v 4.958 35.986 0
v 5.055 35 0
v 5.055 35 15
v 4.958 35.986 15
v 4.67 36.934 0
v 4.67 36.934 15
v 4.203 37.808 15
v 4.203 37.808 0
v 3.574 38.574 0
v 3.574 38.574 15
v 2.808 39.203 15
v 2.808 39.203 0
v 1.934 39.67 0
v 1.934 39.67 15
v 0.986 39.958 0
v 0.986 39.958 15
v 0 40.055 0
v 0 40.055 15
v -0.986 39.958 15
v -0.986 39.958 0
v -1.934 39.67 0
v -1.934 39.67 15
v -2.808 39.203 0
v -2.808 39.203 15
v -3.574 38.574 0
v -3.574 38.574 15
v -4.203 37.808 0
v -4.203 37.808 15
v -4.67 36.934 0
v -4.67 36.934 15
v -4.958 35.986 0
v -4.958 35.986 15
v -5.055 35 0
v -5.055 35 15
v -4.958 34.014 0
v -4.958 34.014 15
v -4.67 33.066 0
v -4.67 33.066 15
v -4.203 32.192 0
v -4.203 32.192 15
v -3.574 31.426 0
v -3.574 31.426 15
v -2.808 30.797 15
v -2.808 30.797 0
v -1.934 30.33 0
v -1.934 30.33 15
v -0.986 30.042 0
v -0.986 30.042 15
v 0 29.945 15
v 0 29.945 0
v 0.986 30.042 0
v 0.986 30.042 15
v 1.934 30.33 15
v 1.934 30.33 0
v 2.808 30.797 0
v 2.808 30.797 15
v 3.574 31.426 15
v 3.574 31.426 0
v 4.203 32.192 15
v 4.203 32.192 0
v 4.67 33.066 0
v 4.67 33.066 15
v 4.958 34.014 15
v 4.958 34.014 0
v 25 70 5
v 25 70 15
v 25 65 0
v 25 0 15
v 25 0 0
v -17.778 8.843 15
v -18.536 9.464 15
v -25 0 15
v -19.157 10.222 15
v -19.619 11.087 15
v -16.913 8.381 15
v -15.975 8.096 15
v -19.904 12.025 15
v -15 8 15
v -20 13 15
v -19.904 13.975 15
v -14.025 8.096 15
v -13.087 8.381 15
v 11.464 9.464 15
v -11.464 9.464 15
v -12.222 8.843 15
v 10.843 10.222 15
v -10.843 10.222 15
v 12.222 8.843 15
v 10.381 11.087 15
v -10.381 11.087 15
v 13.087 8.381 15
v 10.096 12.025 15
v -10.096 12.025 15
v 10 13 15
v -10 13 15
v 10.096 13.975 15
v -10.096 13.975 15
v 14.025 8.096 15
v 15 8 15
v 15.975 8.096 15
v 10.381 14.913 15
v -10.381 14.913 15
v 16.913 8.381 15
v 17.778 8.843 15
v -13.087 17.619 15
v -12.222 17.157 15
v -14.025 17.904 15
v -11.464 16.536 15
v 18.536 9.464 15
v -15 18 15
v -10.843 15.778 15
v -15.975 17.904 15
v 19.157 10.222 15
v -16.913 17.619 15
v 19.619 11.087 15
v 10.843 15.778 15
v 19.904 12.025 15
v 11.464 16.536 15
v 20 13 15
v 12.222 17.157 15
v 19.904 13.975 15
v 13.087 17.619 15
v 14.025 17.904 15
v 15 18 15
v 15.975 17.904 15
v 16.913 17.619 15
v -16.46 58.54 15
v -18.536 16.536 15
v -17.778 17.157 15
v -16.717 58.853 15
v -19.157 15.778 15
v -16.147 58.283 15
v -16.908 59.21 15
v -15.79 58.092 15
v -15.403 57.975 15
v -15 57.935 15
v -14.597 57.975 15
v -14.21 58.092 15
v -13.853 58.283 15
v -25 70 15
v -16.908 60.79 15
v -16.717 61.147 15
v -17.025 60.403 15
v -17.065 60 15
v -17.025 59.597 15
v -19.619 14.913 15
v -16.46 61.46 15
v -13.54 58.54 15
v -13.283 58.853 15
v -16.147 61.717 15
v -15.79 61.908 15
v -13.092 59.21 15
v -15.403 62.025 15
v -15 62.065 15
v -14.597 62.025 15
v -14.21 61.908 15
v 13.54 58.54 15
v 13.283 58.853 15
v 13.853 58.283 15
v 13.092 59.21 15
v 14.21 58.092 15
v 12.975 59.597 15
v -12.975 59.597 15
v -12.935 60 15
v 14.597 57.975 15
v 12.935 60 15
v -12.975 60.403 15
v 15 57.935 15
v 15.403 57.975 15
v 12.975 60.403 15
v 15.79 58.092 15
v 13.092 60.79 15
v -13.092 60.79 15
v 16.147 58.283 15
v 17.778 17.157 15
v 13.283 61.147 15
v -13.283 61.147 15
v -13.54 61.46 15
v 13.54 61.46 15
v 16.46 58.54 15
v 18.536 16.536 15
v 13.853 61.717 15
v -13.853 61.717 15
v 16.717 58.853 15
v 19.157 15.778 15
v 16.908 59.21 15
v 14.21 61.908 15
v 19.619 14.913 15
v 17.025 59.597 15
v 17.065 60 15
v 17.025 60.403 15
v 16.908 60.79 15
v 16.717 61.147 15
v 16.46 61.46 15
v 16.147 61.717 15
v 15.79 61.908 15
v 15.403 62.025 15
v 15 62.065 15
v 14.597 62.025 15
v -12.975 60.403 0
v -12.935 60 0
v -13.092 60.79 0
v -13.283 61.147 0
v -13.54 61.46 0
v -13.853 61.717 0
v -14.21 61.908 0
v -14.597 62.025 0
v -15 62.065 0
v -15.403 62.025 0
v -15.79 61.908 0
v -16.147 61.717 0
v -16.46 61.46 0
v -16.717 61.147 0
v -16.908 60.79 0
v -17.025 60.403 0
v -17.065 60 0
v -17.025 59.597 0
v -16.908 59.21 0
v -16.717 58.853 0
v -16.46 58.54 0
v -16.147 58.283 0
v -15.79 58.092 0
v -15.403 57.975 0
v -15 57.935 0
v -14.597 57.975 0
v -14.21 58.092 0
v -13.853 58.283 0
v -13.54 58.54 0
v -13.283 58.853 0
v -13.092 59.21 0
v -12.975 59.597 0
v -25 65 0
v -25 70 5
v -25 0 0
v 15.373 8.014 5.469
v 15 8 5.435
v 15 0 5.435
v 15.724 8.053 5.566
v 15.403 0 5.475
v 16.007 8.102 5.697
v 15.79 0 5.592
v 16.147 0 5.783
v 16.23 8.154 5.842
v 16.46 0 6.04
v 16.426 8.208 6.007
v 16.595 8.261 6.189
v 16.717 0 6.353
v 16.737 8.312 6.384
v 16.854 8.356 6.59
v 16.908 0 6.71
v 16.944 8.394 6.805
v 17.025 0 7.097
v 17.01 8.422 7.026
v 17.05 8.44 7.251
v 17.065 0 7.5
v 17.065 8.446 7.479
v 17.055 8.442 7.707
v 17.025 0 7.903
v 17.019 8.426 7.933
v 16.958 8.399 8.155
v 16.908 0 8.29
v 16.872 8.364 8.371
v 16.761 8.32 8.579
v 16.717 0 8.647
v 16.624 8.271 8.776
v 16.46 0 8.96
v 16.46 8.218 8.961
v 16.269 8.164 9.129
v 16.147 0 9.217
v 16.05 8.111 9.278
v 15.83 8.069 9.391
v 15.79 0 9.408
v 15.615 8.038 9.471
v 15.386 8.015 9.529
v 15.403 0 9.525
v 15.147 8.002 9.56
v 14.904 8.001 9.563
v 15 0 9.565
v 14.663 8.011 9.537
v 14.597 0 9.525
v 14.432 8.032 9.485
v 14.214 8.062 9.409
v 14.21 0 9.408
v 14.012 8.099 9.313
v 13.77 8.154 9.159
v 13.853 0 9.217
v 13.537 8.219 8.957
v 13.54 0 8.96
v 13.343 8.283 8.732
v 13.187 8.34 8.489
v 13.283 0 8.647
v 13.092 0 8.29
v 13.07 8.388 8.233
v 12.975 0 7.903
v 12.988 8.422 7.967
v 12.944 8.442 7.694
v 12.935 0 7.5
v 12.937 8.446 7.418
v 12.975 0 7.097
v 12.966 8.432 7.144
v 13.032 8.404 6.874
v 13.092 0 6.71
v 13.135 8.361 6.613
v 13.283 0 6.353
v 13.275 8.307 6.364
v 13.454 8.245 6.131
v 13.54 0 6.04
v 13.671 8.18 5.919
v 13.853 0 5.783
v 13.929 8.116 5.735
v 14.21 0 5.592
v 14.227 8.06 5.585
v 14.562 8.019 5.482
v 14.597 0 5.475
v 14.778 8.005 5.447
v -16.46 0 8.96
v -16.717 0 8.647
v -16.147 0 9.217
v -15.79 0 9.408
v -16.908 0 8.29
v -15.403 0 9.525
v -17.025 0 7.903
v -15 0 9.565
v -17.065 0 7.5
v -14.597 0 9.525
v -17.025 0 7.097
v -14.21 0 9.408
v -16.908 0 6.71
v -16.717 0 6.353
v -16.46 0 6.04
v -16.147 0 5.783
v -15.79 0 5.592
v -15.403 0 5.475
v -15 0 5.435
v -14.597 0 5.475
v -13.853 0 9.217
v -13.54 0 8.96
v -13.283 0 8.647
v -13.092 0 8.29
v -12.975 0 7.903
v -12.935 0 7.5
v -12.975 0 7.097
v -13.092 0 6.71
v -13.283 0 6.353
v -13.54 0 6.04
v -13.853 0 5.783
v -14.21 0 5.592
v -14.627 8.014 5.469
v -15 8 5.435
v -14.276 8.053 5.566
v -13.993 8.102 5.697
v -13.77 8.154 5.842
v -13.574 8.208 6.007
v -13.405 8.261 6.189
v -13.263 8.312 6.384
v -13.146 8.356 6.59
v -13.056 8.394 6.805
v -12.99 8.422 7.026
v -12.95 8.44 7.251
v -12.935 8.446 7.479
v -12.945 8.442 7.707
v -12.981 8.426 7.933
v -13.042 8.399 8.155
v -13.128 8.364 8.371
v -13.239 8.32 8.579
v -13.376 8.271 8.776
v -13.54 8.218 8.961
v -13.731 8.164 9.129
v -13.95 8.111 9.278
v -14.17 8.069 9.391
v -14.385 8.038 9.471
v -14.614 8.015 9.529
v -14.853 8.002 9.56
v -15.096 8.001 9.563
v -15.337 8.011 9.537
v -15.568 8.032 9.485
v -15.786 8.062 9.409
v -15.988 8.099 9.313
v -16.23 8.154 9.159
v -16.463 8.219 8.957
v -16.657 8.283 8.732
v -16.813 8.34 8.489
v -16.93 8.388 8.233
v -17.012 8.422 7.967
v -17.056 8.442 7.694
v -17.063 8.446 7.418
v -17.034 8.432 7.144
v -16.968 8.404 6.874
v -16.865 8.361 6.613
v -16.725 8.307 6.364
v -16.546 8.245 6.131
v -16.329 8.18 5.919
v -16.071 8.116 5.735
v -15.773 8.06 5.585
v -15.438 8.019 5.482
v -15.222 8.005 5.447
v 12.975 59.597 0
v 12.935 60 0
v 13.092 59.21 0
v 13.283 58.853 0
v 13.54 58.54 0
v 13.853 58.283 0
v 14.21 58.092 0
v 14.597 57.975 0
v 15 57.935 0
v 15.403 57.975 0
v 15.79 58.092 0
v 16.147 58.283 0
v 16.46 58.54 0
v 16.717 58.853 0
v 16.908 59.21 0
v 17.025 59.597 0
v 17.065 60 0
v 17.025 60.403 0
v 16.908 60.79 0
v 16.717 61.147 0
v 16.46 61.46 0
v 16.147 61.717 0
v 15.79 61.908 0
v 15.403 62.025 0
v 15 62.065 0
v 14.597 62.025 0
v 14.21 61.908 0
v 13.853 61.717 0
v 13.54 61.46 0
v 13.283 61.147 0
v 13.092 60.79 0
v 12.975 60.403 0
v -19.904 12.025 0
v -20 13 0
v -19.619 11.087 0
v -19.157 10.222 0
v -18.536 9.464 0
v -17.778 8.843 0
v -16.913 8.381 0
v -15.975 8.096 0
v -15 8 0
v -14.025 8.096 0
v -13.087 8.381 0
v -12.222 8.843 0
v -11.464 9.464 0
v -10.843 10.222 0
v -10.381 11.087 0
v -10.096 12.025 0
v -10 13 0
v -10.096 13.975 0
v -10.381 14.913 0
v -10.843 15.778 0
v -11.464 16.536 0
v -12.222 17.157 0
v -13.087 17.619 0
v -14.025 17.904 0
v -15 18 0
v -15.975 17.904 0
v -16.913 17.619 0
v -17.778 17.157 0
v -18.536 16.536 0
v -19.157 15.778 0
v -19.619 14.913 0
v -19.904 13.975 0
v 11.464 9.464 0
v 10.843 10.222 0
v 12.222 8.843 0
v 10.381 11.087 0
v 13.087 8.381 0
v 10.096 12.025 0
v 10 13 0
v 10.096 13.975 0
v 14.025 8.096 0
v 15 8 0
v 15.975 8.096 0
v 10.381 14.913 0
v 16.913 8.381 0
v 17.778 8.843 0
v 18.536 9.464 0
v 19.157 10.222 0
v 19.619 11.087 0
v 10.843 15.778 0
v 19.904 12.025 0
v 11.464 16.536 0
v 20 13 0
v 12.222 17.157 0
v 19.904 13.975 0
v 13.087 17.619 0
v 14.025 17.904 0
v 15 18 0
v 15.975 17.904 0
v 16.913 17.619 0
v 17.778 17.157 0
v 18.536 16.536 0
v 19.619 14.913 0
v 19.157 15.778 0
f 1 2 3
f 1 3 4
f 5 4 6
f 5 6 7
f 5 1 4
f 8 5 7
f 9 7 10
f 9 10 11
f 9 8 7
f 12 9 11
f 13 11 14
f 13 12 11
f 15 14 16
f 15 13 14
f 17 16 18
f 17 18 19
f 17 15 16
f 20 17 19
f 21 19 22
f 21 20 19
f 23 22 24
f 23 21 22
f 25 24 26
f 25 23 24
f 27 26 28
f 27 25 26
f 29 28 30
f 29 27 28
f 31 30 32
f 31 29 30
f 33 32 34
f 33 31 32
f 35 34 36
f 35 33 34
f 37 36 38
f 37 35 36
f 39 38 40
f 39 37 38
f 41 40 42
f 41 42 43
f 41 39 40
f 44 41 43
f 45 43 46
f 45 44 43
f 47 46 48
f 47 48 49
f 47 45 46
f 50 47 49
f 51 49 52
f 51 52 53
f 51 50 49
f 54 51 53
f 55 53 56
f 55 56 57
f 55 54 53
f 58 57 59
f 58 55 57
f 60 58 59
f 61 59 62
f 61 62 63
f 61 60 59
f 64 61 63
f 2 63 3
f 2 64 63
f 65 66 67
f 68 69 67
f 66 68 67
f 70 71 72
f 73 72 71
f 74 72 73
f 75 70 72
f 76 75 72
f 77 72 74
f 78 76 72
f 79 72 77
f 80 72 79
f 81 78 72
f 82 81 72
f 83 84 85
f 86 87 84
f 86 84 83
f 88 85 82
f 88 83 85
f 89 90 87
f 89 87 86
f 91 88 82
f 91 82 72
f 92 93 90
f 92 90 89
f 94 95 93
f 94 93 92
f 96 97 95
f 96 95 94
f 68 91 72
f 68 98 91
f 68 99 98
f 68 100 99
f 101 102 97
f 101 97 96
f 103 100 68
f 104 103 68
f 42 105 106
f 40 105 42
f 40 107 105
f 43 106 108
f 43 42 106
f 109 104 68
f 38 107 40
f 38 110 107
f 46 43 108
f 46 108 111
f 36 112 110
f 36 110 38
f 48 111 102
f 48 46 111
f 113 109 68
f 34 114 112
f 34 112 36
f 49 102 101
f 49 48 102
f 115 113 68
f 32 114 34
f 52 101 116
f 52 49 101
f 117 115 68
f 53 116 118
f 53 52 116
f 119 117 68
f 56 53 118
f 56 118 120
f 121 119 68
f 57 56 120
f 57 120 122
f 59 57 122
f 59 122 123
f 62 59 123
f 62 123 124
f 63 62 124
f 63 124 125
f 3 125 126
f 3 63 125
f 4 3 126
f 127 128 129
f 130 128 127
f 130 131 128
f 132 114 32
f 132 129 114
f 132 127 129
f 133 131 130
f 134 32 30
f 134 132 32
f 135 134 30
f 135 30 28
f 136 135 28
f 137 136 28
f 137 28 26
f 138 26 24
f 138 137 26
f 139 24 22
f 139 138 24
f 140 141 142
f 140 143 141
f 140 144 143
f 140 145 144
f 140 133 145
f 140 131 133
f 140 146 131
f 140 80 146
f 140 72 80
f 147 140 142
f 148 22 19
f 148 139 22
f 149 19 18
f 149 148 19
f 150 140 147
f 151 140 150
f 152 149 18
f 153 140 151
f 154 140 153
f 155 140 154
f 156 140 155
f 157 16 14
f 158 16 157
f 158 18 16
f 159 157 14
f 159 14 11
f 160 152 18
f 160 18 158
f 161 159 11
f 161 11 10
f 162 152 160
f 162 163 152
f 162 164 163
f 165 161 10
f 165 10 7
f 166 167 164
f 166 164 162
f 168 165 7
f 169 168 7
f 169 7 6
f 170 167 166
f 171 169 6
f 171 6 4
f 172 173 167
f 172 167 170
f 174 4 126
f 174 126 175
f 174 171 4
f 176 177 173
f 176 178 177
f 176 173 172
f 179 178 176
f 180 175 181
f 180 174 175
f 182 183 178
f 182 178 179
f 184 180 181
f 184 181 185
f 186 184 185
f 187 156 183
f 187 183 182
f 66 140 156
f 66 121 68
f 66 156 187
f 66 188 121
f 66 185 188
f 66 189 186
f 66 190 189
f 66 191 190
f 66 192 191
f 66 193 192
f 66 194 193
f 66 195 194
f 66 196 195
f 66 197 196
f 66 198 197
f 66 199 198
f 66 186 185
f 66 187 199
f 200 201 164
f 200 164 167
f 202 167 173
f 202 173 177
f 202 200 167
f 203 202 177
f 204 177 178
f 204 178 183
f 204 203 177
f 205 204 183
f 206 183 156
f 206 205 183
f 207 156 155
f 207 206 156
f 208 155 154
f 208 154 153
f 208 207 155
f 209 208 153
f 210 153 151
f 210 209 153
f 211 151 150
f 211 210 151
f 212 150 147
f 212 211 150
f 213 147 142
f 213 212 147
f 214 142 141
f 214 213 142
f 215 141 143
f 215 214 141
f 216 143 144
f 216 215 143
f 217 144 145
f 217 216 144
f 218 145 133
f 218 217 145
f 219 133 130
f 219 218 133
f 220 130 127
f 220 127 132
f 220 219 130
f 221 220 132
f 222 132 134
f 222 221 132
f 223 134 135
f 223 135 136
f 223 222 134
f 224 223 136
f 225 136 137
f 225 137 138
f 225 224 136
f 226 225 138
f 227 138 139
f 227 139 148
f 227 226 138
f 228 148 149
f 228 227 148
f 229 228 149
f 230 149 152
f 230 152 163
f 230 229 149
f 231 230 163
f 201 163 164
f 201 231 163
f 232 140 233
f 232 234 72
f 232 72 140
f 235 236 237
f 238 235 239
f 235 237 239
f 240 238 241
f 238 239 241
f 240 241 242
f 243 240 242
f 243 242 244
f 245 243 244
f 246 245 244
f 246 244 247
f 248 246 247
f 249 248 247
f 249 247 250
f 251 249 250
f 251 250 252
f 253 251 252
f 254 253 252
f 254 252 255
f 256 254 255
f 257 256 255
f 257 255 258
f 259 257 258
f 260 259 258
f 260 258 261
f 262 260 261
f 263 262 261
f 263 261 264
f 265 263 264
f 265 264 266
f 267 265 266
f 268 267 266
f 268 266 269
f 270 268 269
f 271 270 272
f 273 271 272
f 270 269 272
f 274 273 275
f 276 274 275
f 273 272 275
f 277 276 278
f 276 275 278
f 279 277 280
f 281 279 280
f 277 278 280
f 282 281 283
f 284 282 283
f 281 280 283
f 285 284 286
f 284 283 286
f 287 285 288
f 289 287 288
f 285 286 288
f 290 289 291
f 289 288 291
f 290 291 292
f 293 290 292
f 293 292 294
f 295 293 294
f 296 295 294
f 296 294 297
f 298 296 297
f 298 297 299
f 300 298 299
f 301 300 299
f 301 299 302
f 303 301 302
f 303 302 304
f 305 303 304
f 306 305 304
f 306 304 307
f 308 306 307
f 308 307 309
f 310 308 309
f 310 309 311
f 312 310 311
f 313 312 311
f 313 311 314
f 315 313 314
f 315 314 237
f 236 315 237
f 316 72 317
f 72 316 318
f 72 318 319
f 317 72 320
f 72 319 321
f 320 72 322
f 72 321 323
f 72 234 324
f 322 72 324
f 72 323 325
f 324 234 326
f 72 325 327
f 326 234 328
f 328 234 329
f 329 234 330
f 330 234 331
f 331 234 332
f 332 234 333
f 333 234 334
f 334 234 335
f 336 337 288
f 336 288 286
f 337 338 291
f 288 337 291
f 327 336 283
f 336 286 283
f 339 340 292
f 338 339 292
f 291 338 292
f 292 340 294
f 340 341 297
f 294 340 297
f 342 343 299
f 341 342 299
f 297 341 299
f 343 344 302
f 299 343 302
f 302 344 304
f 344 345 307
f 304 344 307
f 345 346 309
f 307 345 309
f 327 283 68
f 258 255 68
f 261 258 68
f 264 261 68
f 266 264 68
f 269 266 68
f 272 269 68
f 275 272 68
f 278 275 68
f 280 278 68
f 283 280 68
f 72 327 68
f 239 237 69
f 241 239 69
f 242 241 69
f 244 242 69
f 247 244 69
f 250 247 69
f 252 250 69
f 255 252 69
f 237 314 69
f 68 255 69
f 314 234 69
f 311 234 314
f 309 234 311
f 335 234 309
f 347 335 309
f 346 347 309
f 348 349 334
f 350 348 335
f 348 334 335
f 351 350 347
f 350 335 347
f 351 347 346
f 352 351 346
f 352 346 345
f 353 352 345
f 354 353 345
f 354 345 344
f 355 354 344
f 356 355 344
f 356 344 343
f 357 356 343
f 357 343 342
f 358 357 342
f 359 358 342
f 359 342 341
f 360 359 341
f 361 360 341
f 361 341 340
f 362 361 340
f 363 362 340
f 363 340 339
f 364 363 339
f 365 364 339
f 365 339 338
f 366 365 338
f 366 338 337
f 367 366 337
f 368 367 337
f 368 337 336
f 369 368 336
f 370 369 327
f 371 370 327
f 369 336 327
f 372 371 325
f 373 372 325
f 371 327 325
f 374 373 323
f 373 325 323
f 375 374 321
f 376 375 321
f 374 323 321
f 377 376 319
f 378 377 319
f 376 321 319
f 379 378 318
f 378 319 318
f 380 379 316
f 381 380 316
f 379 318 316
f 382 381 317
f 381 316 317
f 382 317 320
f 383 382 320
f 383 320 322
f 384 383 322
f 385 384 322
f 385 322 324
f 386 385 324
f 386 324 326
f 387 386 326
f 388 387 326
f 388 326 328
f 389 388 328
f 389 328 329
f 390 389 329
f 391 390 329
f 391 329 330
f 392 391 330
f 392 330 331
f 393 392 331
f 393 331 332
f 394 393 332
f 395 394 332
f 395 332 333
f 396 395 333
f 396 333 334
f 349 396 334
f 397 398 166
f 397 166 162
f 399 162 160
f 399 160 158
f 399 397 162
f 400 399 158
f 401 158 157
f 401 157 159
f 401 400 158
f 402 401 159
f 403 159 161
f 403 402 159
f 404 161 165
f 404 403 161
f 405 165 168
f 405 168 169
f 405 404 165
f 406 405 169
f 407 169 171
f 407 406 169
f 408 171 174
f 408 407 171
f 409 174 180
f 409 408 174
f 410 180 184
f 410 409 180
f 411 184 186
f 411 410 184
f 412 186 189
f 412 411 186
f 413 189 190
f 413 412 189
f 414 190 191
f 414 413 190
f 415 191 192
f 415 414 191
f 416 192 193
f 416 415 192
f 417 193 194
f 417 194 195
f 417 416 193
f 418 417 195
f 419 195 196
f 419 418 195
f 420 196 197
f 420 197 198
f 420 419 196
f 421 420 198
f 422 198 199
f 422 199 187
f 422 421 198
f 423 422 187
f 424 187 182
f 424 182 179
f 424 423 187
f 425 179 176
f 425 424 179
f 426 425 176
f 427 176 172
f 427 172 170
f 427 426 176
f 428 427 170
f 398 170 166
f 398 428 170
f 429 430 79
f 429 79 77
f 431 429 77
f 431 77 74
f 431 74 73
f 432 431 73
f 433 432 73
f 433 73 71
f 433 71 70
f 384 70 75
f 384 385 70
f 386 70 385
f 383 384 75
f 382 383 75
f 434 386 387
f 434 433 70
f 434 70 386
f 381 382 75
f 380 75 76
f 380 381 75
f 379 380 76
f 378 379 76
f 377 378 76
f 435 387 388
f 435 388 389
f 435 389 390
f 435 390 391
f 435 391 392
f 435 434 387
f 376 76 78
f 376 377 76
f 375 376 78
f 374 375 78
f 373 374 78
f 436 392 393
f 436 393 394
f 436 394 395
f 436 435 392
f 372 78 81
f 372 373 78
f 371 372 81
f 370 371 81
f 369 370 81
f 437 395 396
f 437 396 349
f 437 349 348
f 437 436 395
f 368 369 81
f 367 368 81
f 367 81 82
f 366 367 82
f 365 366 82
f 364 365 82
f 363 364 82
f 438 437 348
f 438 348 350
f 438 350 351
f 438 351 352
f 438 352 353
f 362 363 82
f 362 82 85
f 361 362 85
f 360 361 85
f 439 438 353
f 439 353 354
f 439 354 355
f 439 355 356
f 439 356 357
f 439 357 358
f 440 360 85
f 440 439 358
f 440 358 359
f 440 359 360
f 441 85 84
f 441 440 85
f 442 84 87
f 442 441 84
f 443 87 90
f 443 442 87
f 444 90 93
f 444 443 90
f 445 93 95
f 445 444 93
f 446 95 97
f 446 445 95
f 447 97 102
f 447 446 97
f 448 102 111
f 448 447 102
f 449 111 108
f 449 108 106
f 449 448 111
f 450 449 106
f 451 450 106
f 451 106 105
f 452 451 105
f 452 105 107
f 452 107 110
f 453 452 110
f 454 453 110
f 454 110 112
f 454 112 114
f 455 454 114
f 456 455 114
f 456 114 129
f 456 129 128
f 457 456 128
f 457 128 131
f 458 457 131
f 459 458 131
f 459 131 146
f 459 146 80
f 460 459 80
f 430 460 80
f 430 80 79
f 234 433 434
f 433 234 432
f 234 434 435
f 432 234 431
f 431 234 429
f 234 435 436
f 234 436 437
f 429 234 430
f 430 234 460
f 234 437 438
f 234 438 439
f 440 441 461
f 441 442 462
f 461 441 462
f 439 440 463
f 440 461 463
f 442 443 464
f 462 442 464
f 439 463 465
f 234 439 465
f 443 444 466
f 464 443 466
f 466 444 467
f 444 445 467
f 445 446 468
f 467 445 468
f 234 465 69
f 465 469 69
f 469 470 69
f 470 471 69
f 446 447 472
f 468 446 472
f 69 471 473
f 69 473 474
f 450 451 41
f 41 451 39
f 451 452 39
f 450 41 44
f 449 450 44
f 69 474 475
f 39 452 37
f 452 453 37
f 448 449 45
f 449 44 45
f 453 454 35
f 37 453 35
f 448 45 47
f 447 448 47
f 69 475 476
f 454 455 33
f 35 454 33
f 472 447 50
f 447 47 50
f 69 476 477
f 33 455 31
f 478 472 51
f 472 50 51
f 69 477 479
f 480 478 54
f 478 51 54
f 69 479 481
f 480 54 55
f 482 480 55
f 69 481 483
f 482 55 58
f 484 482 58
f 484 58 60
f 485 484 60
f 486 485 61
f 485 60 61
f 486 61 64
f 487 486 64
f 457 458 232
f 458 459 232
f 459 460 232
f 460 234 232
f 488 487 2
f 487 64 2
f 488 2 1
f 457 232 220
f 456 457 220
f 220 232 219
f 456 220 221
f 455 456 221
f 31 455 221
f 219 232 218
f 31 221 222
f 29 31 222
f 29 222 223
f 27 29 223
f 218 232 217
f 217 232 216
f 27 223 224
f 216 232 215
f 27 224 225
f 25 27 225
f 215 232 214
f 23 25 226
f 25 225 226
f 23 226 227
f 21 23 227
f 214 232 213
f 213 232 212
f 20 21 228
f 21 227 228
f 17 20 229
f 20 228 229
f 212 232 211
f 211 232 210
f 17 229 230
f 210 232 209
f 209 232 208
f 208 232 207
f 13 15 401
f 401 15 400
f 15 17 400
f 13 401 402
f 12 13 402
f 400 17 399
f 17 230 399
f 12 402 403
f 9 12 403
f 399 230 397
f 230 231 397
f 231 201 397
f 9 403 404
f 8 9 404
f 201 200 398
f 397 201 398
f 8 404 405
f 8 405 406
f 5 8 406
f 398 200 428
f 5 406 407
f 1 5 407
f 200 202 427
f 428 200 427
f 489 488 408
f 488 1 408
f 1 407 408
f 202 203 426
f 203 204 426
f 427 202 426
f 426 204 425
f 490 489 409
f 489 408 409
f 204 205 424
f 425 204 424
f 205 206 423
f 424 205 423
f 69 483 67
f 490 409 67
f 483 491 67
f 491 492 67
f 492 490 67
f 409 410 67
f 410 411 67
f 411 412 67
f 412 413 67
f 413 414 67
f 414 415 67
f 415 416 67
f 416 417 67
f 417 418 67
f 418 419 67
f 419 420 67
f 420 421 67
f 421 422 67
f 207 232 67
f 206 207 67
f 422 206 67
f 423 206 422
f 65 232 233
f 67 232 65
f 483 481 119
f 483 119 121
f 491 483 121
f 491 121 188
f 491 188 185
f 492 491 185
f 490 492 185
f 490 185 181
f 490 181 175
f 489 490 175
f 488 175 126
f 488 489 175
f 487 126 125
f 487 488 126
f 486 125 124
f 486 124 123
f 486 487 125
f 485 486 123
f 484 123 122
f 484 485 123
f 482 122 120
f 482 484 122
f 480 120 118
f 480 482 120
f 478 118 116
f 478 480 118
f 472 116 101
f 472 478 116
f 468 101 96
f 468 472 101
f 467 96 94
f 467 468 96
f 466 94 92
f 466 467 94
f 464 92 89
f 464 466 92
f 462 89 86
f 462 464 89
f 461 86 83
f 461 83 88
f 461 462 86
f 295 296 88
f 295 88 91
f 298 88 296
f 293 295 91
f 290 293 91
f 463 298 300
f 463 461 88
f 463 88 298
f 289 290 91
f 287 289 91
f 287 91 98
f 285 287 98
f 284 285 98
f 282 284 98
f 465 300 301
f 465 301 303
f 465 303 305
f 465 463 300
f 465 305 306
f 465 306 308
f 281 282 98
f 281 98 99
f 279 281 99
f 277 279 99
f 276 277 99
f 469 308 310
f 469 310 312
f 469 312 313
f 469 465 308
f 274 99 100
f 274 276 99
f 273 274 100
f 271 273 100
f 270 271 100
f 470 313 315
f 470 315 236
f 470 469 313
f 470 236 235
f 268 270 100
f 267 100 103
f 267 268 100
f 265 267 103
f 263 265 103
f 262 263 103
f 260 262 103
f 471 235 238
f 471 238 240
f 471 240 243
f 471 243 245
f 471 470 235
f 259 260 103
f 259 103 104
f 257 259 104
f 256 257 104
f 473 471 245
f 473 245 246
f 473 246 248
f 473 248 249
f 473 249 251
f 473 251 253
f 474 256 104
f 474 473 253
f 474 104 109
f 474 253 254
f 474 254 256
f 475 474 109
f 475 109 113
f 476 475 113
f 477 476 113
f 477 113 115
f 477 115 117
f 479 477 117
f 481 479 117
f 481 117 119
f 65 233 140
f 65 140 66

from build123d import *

# Parameters (mm, degrees)
ESQUISSE1_W             = 50
ESQUISSE1_H             = 70
ESQUISSE1_R             = 5
ESQUISSE1_R_2           = 5.055
ESQUISSE1_R_3           = 2.065
BASE_EXTRUSION_DEPTH    = 15
CHANFREIN3_SIZE         = 5
ENL_V_MAT_EXTRU_1_REACH = 77.829
ESQUISSE2_R             = 2.065


with BuildPart() as part:
    # Esquisse1 → Base-Extrusion (new body)
    with BuildSketch(Plane.XY):
        with Locations((0, 35)):
            Rectangle(ESQUISSE1_W, ESQUISSE1_H)
        with Locations((15, 13)):
            Circle(ESQUISSE1_R, mode=Mode.SUBTRACT)
        with Locations(Location((-15, 13, 0), (0, 0, 180))):
            Circle(ESQUISSE1_R, mode=Mode.SUBTRACT)
        with Locations((0, 35)):
            Circle(ESQUISSE1_R_2, mode=Mode.SUBTRACT)
        with Locations((-15, 60)):
            Circle(ESQUISSE1_R_3, mode=Mode.SUBTRACT)
        with Locations(Location((15, 60, 0), (0, 0, 180))):
            Circle(ESQUISSE1_R_3, mode=Mode.SUBTRACT)
    extrude(amount=BASE_EXTRUSION_DEPTH)

    # Chanfrein3
    chanfrein3_edges = [part.edges().sort_by_distance(p)[0] for p in [
        (0, 70, 0),
    ]]
    chamfer(chanfrein3_edges, length=CHANFREIN3_SIZE)

    # Esquisse2 → Enlèv. mat.-Extru.1 (cut, up to next)
    with BuildSketch(Plane.XZ, mode=Mode.PRIVATE) as enl_v_mat_extru_1_sk1:
        with Locations(Location((15, 7.5, 0), (0, 0, 270))):
            Circle(ESQUISSE2_R)
    enl_v_mat_extru_1_tool1 = extrude(enl_v_mat_extru_1_sk1.sketch, amount=-ENL_V_MAT_EXTRU_1_REACH, mode=Mode.PRIVATE) & part.part
    # Esquisse2 → Enlèv. mat.-Extru.1 (cut, up to next)
    with BuildSketch(Plane.XZ, mode=Mode.PRIVATE) as enl_v_mat_extru_1_sk2:
        with Locations(Location((-15, 7.5, 0), (0, 0, 270))):
            Circle(ESQUISSE2_R)
    enl_v_mat_extru_1_tool2 = extrude(enl_v_mat_extru_1_sk2.sketch, amount=-ENL_V_MAT_EXTRU_1_REACH, mode=Mode.PRIVATE) & part.part
    add(enl_v_mat_extru_1_tool1.solids().sort_by_distance((15, 0, 7.5))[0], mode=Mode.SUBTRACT)
    add(enl_v_mat_extru_1_tool2.solids().sort_by_distance((-15, 0, 7.5))[0], mode=Mode.SUBTRACT)


solid = part.part
